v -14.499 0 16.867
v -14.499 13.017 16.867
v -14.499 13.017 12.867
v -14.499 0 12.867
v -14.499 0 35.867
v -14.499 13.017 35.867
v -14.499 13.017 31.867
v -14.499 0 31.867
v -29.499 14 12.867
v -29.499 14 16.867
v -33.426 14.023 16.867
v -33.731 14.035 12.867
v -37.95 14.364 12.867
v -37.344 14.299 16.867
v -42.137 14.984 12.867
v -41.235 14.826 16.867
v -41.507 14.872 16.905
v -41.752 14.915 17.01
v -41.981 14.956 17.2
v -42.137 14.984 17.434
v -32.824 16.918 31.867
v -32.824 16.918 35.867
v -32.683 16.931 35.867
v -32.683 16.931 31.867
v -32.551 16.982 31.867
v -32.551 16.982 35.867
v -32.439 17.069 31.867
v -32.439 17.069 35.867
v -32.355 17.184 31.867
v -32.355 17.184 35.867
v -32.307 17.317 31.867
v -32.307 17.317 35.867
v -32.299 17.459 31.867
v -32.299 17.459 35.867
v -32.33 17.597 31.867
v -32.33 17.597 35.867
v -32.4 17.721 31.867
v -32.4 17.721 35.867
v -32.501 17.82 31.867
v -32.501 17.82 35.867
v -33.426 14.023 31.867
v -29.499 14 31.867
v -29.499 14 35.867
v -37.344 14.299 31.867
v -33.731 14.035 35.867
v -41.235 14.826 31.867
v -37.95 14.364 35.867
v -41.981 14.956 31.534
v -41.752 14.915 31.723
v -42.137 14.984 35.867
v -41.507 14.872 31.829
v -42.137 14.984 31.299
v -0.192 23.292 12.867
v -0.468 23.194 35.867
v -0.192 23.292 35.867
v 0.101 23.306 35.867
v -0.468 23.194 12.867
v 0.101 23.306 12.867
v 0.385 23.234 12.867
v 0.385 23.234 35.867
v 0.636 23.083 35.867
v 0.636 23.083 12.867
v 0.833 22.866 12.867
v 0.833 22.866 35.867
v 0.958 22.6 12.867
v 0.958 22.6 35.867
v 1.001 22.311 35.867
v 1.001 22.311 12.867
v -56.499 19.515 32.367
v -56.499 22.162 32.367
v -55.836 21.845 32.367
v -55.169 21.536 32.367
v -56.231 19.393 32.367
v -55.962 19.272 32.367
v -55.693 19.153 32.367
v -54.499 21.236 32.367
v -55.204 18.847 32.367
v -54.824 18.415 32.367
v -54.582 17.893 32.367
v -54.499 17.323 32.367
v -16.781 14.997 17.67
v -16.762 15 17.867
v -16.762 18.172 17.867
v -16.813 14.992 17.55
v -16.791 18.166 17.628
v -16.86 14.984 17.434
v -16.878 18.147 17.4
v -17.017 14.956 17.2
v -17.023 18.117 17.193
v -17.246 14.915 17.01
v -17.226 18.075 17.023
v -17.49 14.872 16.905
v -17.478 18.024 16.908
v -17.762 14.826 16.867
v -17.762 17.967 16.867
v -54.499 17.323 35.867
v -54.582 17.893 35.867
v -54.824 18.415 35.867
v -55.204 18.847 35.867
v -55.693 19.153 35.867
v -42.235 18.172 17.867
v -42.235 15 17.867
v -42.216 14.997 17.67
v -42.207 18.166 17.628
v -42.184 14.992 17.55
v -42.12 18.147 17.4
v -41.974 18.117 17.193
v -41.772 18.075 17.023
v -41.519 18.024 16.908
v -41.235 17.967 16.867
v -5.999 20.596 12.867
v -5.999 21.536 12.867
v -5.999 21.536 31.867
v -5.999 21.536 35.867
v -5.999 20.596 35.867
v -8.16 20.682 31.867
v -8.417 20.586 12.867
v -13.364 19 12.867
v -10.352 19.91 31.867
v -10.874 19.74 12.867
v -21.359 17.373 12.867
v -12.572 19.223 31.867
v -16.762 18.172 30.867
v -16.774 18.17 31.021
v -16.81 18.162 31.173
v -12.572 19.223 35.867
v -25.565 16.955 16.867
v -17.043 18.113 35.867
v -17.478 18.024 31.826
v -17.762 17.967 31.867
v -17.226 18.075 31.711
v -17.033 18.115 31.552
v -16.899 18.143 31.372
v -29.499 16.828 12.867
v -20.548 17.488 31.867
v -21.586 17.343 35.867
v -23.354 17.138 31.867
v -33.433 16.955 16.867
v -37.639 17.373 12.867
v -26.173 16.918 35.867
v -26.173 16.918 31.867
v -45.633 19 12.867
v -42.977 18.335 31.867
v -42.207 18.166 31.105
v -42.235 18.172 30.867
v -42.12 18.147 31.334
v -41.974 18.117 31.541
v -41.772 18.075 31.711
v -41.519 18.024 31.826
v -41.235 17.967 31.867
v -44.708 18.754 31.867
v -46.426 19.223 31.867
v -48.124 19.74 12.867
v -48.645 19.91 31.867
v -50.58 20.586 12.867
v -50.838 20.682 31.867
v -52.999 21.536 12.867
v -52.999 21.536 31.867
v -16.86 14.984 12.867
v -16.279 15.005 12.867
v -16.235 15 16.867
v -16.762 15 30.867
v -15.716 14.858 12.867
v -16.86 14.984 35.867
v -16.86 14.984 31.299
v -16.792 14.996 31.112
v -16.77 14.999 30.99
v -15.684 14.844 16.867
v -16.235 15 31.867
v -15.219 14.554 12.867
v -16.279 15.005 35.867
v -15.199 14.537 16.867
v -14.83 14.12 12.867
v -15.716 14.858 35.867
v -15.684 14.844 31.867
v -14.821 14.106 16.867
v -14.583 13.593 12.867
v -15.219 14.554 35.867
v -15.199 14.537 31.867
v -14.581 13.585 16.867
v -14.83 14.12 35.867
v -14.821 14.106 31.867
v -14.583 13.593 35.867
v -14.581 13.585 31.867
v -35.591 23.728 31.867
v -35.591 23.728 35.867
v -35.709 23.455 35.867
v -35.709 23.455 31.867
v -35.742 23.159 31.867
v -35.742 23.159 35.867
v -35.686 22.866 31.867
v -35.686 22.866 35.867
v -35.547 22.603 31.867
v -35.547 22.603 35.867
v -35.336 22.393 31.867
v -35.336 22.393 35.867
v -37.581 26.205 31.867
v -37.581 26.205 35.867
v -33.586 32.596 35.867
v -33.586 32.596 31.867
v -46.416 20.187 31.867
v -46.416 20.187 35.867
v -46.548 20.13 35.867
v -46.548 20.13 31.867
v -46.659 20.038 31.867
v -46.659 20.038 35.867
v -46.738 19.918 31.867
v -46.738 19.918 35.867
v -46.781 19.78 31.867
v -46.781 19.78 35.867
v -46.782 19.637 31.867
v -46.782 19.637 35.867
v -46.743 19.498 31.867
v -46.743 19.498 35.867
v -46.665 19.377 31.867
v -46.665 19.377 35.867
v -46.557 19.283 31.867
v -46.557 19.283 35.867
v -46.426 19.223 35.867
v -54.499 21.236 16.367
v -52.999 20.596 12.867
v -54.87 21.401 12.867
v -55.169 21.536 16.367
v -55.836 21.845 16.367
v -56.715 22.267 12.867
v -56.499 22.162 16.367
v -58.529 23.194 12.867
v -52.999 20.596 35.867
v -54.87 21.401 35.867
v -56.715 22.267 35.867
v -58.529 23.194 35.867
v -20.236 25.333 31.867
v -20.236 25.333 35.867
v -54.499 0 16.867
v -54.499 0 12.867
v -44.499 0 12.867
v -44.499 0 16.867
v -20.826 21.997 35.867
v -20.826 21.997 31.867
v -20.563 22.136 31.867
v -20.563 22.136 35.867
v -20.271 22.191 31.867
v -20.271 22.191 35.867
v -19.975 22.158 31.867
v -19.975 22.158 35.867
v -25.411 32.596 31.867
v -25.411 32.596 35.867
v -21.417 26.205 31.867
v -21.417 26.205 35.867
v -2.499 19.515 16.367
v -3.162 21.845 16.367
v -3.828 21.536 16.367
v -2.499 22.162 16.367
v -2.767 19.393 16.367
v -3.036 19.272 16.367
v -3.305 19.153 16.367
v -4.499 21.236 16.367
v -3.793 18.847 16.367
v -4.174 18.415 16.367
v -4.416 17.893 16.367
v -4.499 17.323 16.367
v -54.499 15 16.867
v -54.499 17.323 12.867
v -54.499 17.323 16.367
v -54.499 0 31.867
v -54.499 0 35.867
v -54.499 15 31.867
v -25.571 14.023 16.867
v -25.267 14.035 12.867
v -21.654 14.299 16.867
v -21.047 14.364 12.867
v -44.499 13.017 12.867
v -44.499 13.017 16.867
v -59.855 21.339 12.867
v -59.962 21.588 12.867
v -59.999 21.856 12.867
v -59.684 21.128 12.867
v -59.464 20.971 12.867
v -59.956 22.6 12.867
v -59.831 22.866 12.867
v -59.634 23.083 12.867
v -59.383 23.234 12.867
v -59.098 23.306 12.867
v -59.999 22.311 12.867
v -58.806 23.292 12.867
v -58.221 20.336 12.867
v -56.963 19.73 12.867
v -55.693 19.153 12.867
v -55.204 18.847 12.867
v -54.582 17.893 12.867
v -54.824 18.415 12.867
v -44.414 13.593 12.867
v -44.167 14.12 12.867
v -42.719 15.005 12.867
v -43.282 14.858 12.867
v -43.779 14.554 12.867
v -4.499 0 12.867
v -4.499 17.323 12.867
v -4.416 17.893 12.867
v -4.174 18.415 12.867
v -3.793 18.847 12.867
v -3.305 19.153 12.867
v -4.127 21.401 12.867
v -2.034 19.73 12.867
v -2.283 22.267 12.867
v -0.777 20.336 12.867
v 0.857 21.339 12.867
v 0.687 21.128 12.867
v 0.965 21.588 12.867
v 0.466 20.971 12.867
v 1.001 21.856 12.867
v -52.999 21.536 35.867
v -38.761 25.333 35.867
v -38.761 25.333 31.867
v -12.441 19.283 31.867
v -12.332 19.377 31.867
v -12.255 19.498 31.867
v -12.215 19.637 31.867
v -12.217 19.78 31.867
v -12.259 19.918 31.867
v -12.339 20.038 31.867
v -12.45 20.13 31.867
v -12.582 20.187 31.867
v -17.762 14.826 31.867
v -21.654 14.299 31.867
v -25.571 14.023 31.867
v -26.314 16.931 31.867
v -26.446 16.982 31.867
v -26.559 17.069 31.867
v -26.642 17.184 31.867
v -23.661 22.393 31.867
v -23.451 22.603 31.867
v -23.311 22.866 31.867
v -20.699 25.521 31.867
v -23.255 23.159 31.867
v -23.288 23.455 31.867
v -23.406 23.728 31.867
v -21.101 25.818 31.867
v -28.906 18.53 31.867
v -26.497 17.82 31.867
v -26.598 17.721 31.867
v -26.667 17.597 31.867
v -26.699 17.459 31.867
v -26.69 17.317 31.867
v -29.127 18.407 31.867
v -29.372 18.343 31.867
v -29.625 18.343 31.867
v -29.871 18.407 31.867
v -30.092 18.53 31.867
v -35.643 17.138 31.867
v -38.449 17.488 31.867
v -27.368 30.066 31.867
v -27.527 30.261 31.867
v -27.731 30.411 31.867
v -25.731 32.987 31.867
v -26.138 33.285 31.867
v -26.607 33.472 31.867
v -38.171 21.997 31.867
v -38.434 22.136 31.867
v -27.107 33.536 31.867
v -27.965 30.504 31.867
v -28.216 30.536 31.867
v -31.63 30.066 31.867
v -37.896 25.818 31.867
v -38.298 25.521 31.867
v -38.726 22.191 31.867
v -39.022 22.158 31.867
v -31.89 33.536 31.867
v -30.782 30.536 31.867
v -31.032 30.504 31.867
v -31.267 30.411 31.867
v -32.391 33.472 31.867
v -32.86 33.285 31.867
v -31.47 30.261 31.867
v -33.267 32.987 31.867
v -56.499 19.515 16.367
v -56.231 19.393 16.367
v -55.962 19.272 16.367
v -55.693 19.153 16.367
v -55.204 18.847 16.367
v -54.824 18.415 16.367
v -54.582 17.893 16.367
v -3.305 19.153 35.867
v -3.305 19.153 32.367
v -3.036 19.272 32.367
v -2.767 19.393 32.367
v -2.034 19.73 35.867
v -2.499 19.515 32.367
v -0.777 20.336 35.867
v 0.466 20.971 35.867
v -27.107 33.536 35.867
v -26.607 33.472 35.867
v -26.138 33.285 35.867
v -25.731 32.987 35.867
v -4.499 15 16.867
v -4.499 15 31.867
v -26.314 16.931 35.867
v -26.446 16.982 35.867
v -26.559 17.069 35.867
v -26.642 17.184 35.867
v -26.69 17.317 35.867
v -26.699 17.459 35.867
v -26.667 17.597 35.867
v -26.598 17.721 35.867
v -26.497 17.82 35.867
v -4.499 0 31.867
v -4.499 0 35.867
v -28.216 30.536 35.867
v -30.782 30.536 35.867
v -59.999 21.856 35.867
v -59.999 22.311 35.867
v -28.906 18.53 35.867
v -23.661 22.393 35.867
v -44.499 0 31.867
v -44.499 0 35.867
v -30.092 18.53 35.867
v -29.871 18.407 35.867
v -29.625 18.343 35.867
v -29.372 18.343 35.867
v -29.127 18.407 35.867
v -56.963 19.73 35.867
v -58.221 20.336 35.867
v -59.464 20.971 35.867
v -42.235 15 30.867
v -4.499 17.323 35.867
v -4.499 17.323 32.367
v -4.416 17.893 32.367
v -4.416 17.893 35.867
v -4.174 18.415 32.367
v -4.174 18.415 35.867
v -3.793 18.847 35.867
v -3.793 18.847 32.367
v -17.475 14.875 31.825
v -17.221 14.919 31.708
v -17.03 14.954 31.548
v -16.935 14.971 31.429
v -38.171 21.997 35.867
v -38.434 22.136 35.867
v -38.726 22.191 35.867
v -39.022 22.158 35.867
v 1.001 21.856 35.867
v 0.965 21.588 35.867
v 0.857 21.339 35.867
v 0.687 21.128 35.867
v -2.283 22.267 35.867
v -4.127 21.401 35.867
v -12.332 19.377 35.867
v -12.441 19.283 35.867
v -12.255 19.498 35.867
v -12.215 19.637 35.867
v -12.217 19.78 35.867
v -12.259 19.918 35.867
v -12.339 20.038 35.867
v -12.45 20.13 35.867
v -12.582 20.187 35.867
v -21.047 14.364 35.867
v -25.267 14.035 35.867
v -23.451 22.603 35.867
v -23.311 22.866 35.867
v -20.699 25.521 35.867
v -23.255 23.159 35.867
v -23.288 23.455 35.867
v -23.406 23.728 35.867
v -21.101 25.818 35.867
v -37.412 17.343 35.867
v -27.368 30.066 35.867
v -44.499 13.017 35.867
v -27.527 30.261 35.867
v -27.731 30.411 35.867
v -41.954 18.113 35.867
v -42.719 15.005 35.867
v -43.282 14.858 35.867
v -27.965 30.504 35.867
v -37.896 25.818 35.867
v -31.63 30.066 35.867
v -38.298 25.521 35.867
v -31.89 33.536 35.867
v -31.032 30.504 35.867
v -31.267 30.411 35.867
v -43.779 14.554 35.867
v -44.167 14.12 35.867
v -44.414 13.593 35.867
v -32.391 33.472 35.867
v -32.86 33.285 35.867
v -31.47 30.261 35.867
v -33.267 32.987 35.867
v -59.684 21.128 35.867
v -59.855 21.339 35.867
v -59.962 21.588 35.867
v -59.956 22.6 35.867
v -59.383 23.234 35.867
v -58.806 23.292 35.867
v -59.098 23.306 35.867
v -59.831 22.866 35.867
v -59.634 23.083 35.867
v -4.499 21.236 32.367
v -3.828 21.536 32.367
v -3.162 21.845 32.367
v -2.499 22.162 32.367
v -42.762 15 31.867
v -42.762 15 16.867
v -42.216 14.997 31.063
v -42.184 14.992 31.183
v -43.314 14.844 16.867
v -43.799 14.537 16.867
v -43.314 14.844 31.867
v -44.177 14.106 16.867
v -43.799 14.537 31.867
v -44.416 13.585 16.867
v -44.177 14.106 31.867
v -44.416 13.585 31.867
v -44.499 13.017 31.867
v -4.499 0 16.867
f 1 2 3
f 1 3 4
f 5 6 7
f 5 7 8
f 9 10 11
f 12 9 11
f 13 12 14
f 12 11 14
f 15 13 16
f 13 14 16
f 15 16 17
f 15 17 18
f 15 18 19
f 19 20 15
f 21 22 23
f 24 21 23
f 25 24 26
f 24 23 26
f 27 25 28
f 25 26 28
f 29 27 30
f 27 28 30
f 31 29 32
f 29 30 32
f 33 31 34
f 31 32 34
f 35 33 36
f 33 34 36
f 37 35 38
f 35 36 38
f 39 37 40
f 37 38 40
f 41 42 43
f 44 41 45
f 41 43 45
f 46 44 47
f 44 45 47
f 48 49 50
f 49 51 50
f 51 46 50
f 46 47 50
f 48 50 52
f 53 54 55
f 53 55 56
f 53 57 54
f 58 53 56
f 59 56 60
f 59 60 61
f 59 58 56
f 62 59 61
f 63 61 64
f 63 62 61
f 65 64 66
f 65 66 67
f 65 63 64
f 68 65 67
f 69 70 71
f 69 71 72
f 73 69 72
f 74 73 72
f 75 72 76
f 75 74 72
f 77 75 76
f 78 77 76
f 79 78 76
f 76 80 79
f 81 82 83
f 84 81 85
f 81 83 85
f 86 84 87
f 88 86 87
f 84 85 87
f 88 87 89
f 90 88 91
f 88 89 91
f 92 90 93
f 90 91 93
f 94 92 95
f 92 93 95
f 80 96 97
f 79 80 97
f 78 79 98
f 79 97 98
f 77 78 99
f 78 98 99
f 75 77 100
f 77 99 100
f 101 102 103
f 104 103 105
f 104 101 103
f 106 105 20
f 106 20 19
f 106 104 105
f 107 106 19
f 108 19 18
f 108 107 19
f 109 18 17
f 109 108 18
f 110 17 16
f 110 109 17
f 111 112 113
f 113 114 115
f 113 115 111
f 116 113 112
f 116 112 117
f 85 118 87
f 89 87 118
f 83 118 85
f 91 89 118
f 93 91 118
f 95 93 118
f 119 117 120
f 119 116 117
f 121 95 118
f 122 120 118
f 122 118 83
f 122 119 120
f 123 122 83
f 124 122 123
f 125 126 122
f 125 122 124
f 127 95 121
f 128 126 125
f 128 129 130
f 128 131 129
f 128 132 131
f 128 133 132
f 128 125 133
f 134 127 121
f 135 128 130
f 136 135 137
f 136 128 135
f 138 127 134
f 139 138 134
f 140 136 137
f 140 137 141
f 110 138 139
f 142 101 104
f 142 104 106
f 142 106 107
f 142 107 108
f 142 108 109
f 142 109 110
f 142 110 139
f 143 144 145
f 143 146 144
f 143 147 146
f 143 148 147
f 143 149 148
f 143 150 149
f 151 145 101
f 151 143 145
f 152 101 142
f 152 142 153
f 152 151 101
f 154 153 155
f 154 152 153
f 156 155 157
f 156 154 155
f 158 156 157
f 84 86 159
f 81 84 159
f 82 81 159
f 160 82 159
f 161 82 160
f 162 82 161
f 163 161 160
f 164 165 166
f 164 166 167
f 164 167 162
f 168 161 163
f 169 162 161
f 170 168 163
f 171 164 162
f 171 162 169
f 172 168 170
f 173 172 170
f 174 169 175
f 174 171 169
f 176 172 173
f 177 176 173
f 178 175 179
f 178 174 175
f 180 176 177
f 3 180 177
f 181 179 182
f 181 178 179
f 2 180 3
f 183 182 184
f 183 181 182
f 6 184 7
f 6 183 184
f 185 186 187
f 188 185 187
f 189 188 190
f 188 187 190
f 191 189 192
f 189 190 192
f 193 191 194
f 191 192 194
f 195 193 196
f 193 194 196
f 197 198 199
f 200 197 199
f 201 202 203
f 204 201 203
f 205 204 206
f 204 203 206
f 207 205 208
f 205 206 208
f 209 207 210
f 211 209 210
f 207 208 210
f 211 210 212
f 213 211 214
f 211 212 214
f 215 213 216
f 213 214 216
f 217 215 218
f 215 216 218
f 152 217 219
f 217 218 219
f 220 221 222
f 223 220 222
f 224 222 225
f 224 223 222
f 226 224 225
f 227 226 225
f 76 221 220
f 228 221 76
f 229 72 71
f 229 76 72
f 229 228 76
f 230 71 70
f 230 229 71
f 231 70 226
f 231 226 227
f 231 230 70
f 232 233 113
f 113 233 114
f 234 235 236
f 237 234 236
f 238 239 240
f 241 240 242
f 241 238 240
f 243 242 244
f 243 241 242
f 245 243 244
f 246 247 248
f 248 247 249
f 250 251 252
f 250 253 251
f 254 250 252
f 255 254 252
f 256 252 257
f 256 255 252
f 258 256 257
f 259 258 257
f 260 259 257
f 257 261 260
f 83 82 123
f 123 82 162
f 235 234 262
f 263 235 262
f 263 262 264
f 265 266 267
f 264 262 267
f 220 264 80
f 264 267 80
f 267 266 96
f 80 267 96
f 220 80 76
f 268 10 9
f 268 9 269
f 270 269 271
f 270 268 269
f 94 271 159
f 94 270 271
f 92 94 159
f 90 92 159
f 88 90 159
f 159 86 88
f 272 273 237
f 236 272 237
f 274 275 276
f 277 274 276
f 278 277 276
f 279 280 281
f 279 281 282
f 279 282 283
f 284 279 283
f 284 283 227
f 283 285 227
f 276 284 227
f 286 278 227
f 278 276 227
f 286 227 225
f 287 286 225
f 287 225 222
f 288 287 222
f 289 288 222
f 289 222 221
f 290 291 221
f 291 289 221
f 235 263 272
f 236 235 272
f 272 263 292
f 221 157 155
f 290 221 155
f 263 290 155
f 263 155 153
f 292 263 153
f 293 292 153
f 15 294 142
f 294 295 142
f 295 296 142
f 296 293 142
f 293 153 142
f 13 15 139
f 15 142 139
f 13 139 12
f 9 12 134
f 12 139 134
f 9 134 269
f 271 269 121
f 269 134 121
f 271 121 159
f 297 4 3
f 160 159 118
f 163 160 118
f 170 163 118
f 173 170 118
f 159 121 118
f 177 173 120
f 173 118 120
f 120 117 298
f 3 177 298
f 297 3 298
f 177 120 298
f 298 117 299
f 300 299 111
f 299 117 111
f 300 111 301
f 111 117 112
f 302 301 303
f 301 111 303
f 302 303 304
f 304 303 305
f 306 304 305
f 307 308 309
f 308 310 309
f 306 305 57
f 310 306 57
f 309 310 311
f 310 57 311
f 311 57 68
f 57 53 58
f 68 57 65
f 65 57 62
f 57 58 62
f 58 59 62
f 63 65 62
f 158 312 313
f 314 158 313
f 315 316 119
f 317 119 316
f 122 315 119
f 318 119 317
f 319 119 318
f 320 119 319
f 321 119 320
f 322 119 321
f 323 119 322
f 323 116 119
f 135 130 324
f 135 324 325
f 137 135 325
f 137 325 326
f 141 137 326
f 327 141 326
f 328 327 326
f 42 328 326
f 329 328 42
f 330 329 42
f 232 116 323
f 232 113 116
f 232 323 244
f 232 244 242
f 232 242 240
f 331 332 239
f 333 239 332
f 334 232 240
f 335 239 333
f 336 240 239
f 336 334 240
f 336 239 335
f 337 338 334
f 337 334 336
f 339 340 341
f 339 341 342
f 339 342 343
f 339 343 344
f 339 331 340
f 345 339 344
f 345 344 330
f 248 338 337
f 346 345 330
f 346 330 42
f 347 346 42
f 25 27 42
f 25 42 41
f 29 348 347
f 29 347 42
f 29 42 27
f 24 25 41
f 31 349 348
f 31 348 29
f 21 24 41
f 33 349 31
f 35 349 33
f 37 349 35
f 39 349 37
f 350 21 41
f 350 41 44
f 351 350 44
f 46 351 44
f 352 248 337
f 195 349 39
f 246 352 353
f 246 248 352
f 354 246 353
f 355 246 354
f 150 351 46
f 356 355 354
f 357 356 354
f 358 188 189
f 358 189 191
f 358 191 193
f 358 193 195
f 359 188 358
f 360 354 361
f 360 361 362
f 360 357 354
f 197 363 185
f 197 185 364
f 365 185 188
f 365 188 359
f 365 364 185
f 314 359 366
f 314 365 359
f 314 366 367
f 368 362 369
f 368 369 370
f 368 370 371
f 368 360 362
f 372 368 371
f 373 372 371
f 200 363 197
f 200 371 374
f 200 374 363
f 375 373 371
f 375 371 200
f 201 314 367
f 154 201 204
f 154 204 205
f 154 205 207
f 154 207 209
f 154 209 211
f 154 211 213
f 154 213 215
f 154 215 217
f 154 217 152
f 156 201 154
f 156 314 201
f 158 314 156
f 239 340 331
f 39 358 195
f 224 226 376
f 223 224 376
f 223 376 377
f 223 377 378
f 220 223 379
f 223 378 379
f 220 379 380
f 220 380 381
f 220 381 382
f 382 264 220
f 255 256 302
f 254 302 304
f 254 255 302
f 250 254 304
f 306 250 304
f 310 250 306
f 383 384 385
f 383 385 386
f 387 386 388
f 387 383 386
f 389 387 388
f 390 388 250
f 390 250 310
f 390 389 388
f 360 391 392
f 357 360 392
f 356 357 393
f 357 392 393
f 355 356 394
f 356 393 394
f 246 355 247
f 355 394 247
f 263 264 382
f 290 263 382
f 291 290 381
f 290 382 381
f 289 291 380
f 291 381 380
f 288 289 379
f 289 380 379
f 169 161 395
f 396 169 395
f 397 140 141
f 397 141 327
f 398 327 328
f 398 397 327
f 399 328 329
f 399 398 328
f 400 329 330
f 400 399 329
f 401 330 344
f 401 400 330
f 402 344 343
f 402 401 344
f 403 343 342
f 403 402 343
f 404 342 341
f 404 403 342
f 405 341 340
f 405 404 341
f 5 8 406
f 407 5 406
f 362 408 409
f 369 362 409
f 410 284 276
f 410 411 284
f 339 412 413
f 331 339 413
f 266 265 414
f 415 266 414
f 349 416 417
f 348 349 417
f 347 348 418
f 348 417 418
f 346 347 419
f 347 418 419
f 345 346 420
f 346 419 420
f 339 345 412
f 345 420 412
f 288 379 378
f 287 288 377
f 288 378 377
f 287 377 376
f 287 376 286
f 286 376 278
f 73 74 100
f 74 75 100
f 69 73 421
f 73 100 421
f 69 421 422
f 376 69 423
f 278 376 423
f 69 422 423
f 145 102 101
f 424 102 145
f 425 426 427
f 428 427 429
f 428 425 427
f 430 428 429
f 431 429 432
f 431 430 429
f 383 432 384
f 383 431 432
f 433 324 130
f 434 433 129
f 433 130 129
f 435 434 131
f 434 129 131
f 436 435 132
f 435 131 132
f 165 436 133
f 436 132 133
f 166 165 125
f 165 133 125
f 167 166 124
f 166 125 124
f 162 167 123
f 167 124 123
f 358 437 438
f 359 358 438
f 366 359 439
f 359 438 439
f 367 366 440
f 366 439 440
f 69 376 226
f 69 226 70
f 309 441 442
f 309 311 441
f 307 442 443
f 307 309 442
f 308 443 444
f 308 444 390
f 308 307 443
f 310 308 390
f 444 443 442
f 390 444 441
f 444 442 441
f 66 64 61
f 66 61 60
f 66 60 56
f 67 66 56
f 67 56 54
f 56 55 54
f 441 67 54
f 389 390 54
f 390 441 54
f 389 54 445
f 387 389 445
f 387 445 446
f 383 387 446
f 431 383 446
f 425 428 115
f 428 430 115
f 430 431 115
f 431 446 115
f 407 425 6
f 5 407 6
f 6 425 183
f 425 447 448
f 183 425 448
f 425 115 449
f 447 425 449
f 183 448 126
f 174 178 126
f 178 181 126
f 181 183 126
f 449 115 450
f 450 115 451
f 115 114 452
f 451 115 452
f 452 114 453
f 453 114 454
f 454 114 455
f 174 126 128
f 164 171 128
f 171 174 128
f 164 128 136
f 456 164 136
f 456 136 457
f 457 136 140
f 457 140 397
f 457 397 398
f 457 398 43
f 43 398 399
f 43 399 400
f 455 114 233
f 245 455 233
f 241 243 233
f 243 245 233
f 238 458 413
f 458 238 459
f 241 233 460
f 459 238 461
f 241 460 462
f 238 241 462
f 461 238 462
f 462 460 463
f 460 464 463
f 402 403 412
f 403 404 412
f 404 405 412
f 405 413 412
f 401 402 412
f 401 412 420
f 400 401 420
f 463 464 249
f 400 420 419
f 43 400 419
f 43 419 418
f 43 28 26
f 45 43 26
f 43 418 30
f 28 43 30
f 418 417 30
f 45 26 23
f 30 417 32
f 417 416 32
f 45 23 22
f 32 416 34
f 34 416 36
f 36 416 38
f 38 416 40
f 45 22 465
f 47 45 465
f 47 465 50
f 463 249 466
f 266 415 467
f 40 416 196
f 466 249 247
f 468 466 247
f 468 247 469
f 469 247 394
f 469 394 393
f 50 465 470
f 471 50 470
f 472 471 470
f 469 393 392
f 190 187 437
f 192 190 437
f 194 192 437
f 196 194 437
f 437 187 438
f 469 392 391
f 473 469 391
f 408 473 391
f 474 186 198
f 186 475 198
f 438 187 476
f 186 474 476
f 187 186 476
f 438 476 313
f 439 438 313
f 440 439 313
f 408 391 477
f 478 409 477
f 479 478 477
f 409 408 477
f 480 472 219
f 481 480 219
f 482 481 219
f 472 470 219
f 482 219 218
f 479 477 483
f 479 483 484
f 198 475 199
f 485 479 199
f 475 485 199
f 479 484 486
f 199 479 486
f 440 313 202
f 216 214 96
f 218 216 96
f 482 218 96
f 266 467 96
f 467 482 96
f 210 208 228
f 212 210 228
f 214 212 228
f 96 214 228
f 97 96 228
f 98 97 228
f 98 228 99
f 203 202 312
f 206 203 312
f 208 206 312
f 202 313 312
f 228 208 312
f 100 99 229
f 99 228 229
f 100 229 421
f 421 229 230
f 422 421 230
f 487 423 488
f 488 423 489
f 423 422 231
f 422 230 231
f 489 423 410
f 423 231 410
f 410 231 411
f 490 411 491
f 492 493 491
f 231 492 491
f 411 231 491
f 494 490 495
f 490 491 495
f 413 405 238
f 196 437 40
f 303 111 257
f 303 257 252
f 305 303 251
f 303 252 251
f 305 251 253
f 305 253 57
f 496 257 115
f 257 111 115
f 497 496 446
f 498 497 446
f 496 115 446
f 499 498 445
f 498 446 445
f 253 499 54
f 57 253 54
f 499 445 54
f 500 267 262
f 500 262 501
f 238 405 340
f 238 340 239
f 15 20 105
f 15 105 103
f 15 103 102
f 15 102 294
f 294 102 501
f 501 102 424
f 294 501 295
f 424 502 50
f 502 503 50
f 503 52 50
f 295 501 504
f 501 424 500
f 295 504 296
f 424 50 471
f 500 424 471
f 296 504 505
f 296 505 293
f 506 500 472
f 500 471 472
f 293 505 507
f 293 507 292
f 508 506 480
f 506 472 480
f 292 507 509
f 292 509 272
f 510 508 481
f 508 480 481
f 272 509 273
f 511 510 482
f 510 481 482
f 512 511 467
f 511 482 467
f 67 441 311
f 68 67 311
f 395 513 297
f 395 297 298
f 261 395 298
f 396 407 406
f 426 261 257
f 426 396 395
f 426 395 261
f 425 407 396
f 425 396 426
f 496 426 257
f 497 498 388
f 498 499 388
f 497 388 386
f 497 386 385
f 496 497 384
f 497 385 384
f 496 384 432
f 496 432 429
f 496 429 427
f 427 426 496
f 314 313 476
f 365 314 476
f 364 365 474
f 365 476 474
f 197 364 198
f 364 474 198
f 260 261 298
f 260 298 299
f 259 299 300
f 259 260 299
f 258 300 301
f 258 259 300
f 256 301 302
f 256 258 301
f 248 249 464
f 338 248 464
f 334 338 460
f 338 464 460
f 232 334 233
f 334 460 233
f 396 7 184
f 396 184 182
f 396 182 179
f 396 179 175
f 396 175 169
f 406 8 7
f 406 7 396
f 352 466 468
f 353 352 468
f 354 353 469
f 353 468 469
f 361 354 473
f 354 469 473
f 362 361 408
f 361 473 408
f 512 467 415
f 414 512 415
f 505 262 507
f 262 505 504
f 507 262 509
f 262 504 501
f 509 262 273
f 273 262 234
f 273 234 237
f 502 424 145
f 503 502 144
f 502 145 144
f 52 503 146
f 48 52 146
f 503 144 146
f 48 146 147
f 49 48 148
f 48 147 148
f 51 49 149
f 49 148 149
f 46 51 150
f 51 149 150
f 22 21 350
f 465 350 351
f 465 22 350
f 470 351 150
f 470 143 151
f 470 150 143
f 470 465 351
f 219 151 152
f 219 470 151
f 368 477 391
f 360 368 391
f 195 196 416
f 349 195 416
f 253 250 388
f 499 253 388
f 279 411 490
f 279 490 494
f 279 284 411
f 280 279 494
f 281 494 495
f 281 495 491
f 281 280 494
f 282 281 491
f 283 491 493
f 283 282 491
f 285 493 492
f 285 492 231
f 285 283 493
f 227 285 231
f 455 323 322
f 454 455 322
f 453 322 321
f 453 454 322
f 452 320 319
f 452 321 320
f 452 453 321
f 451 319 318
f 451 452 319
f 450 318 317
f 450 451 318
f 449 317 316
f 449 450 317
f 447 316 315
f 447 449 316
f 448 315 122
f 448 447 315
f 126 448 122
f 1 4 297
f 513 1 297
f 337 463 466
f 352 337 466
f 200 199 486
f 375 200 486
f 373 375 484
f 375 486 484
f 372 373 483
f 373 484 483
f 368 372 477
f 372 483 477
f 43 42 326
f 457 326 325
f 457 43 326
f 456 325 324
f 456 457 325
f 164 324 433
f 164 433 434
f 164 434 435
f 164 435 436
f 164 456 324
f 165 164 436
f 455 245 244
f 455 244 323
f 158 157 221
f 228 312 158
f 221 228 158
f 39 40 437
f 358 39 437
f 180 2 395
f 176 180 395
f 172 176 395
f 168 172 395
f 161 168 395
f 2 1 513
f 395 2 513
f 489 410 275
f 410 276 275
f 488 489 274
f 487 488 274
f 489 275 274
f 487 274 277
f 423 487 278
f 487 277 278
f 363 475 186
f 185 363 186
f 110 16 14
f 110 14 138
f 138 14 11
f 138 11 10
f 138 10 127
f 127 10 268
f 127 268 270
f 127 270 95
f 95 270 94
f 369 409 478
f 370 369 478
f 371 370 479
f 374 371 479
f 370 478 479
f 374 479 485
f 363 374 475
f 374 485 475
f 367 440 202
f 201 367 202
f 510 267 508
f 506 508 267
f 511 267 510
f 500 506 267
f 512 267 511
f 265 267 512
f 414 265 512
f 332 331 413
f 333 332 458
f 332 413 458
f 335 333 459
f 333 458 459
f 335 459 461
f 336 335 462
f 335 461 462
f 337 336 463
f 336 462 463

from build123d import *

# Parameters (mm, degrees)
SKETCH_1_W          = 61
SKETCH_1_H          = 4
EXTRUDE_1_DEPTH     = 15
EXTRUDE_1_2_DEPTH   = 15
SKETCH_2_W          = 61
SKETCH_2_H          = 23
EXTRUDE_2_DEPTH     = 4
EXTRUDE_3_DEPTH     = 23
CUT_EXTRUDE_1_DEPTH = 23
CUT_EXTRUDE_2_DEPTH = 23
CUT_EXTRUDE_3_DEPTH = 23
FILLET_1_R          = 1
SKETCH_9_W          = 2
SKETCH_9_H          = 16
CUT_EXTRUDE_4_DEPTH = 40
FILLET_2_R          = 1
SKETCH_10_W         = 25.473517425
SKETCH_10_H         = 15
CUT_EXTRUDE_5_DEPTH = 40
FILLET_3_R          = 1
EXTRUDE_4_DEPTH     = 4
CUT_EXTRUDE_6_DEPTH = 40


with BuildPart() as part:
    # 草图1 → 凸台-拉伸1 (new body)
    with BuildSketch(Plane(origin=(0, 0, 0), x_dir=(1, 0, 0), z_dir=(0, 1, 0))):
        with Locations((-29.49872666, -14.866833958)):
            Rectangle(SKETCH_1_W, SKETCH_1_H)
    extrude(amount=EXTRUDE_1_DEPTH)



with BuildPart() as body_2:
    # 草图1 → Extrude 1 2 (new body)
    with BuildSketch(Plane(origin=(0, 0, 0), x_dir=(1, 0, 0), z_dir=(0, 1, 0))):
        with Locations((-29.49872666, -33.866833958)):
            Rectangle(SKETCH_1_W, SKETCH_1_H)
    extrude(amount=EXTRUDE_1_2_DEPTH)


with BuildPart() as part_1:
    add(part.part)

    add(body_2.part)  # 凸台-拉伸2 merges body 2
    # 草图2 → 凸台-拉伸2 (add)
    with BuildSketch(Plane(origin=(0, 15, 0), x_dir=(1, 0, 0), z_dir=(0, 1, 0))):
        with Locations((-29.49872666, -24.366833958)):
            Rectangle(SKETCH_2_W, SKETCH_2_H)
    extrude(amount=EXTRUDE_2_DEPTH)

    # 草图3 → 凸台-拉伸3 (add)
    with BuildSketch(Plane.XY.offset(35.866833958)):
        with BuildLine():
            Line((-59.99872666, 25), (-59.99872666, 19))
            Line((-59.99872666, 19), (-45.633143428, 19))
            ThreePointArc((-45.633143428, 19), (-53.008133433, 21.539826341), (-59.99872666, 25))
        make_face()
        with BuildLine():
            ThreePointArc((1.00127334, 25), (-5.989319887, 21.539826341), (-13.364309893, 19))
            Line((-13.364309893, 19), (1.00127334, 19))
            Line((1.00127334, 19), (1.00127334, 25))
        make_face()
    extrude(amount=-EXTRUDE_3_DEPTH)

    # 草图4 → 切除-拉伸1 (cut)
    with BuildSketch(Plane.XY.offset(35.866833958)):
        with BuildLine():
            Line((-59.99872666, 25), (1.00127334, 25))
            ThreePointArc((1.00127334, 25), (-29.49872666, 16.827549631), (-59.99872666, 25))
        make_face()
    extrude(amount=-CUT_EXTRUDE_1_DEPTH, mode=Mode.SUBTRACT)

    # 草图7 → 切除-拉伸2 (cut)
    with BuildSketch(Plane.XY.offset(35.866833958)):
        with BuildLine():
            Line((-44.49872666, 0), (-29.49872666, 0))
            Line((-29.49872666, 0), (-29.49872666, 14))
            ThreePointArc((-29.49872666, 14), (-35.843538639, 14.163021123), (-42.13706744, 14.984428559))
            ThreePointArc((-42.13706744, 14.984428559), (-43.778703527, 14.554168766), (-44.49872666, 13.017399681))
            Line((-44.49872666, 13.017399681), (-44.49872666, 0))
        make_face()
        with BuildLine():
            Line((-54.49872666, 0), (-54.49872666, 17.322648745))
            ThreePointArc((-54.49872666, 17.322648745), (-54.823583781, 18.41530438), (-55.692622995, 19.15300305))
            ThreePointArc((-55.692622995, 19.15300305), (-57.866323827, 20.161752214), (-59.99872666, 21.255099523))
            Line((-59.99872666, 21.255099523), (-59.99872666, 0))
            Line((-59.99872666, 0), (-54.49872666, 0))
        make_face()
    cut_extrude_2 = extrude(amount=-CUT_EXTRUDE_2_DEPTH, mode=Mode.SUBTRACT)

    # 草图8 → 切除-拉伸3 (cut)
    with BuildSketch(Plane.XY.offset(35.866833958)):
        with BuildLine():
            Line((-59.99872666, 24), (-59.99872666, 25))
            Line((-59.99872666, 25), (-52.99872666, 25))
            Line((-52.99872666, 25), (-52.99872666, 20.59639466))
            ThreePointArc((-52.99872666, 20.59639466), (-56.552305579, 22.188004639), (-59.99872666, 24))
        make_face()
    cut_extrude_3 = extrude(amount=-CUT_EXTRUDE_3_DEPTH, mode=Mode.SUBTRACT)

    # 圆角1
    fillet_1_edges = [part_1.edges().sort_by_distance(p)[0] for p in [
        (-59.99872666, 21.255099523, 24.366833958),
        (-59.99872666, 24, 24.366833958),
    ]]
    fillet(fillet_1_edges, radius=FILLET_1_R)

    # 草图9 → 切除-拉伸4 (cut)
    with BuildSketch(Plane.XZ):
        with Locations((-55.49872666, 24.366833958)):
            Rectangle(SKETCH_9_W, SKETCH_9_H)
    cut_extrude_4 = extrude(amount=-CUT_EXTRUDE_4_DEPTH, mode=Mode.SUBTRACT)

    # 镜向3: 切除-拉伸2 across plane
    add(cut_extrude_2.mirror(Plane.ZY.offset(29.49872666)), mode=Mode.SUBTRACT)

    # 镜向4: 切除-拉伸3 across plane
    add(cut_extrude_3.mirror(Plane.ZY.offset(29.49872666)), mode=Mode.SUBTRACT)

    # 圆角2
    fillet_2_edges = [part_1.edges().sort_by_distance(p)[0] for p in [
        (1.00127334, 21.255099523, 24.366833958),
        (1.00127334, 24, 24.366833958),
    ]]
    fillet(fillet_2_edges, radius=FILLET_2_R)

    # 镜向7: 切除-拉伸4 across plane
    add(cut_extrude_4.mirror(Plane.ZY.offset(29.49872666)), mode=Mode.SUBTRACT)

    # 草图10 → 切除-拉伸5 (cut)
    with BuildSketch(Plane.XZ):
        with Locations((-29.498726661, 24.366833958)):
            Rectangle(SKETCH_10_W, SKETCH_10_H)
    extrude(amount=-CUT_EXTRUDE_5_DEPTH, mode=Mode.SUBTRACT)

    # 圆角3
    fillet_3_edges = [part_1.edges().sort_by_distance(p)[0] for p in [
        (-16.761967948, 16.586040333, 16.866833958),
        (-42.235485373, 16.586040333, 16.866833958),
        (-42.235485373, 16.586040333, 31.866833958),
        (-16.761967948, 16.586040333, 31.866833958),
    ]]
    fillet(fillet_3_edges, radius=FILLET_3_R)

    # 草图11 → 凸台-拉伸4 (add)
    with BuildSketch(Plane.XY.offset(35.866833958)):
        with BuildLine():
            Line((-52.99872666, 21.535898385), (-38.761178229, 25.332577966))
            ThreePointArc((-38.761178229, 25.332577966), (-38.087895944, 25.656566573), (-37.580506922, 26.205049966))
            Line((-37.580506922, 26.205049966), (-33.586227985, 32.595896265))
            ThreePointArc((-33.586227985, 32.595896265), (-32.859768442, 33.285183347), (-31.890231377, 33.535898385))
            Line((-31.890231377, 33.535898385), (-27.107221943, 33.535898385))
            ThreePointArc((-27.107221943, 33.535898385), (-26.137684878, 33.285183347), (-25.411225335, 32.595896265))
            Line((-25.411225335, 32.595896265), (-21.416946398, 26.205049966))
            ThreePointArc((-21.416946398, 26.205049966), (-20.909557376, 25.656566573), (-20.236275091, 25.332577966))
            Line((-20.236275091, 25.332577966), (-5.99872666, 21.535898385))
            ThreePointArc((-5.99872666, 21.535898385), (-29.49872666, 16.827549631), (-52.99872666, 21.535898385))
        make_face()
    extrude(amount=-EXTRUDE_4_DEPTH)

    # 草图13 → 切除-拉伸6 (cut)
    with BuildSketch(Plane.XY.offset(35.866833958)):
        with BuildLine():
            Line((-31.629734398, 30.065897325), (-35.591020119, 23.727840171))
            ThreePointArc((-35.591020119, 23.727840171), (-35.725277784, 23.010296005), (-35.336096399, 22.392693705))
            Line((-35.336096399, 22.392693705), (-30.091801244, 18.529726902))
            ThreePointArc((-30.091801244, 18.529726902), (-29.49872666, 18.334874428), (-28.905652077, 18.529726902))
            Line((-28.905652077, 18.529726902), (-23.661356922, 22.392693705))
            ThreePointArc((-23.661356922, 22.392693705), (-23.272175536, 23.010296005), (-23.406433201, 23.727840171))
            Line((-23.406433201, 23.727840171), (-27.367718922, 30.065897325))
            ThreePointArc((-27.367718922, 30.065897325), (-27.730948694, 30.410540866), (-28.215717226, 30.535898385))
            Line((-28.215717226, 30.535898385), (-30.781736094, 30.535898385))
            ThreePointArc((-30.781736094, 30.535898385), (-31.266504627, 30.410540866), (-31.629734398, 30.065897325))
        make_face()
        with BuildLine():
            Line((-39.022032341, 22.158181931), (-46.415604198, 20.186562769))
            ThreePointArc((-46.415604198, 20.186562769), (-46.786746411, 19.708589315), (-46.425517056, 19.2230808))
            ThreePointArc((-46.425517056, 19.2230808), (-39.690366454, 17.684965064), (-32.824491011, 16.918278649))
            ThreePointArc((-32.824491011, 16.918278649), (-32.326643896, 17.248573111), (-32.500693355, 17.820108732))
            Line((-32.500693355, 17.820108732), (-38.171295107, 21.997094517))
            ThreePointArc((-38.171295107, 21.997094517), (-38.578325126, 22.174488298), (-39.022032341, 22.158181931))
        make_face()
        with BuildLine():
            Line((-19.97542098, 22.158181931), (-12.581849122, 20.186562769))
            ThreePointArc((-12.581849122, 20.186562769), (-12.210706909, 19.708589315), (-12.571936264, 19.2230808))
            ThreePointArc((-12.571936264, 19.2230808), (-19.307086867, 17.684965064), (-26.17296231, 16.918278649))
            ThreePointArc((-26.17296231, 16.918278649), (-26.670809424, 17.248573111), (-26.496759965, 17.820108732))
            Line((-26.496759965, 17.820108732), (-20.826158214, 21.997094517))
            ThreePointArc((-20.826158214, 21.997094517), (-20.419128195, 22.174488298), (-19.97542098, 22.158181931))
        make_face()
    extrude(amount=-CUT_EXTRUDE_6_DEPTH, mode=Mode.SUBTRACT)


solid = part_1.part
